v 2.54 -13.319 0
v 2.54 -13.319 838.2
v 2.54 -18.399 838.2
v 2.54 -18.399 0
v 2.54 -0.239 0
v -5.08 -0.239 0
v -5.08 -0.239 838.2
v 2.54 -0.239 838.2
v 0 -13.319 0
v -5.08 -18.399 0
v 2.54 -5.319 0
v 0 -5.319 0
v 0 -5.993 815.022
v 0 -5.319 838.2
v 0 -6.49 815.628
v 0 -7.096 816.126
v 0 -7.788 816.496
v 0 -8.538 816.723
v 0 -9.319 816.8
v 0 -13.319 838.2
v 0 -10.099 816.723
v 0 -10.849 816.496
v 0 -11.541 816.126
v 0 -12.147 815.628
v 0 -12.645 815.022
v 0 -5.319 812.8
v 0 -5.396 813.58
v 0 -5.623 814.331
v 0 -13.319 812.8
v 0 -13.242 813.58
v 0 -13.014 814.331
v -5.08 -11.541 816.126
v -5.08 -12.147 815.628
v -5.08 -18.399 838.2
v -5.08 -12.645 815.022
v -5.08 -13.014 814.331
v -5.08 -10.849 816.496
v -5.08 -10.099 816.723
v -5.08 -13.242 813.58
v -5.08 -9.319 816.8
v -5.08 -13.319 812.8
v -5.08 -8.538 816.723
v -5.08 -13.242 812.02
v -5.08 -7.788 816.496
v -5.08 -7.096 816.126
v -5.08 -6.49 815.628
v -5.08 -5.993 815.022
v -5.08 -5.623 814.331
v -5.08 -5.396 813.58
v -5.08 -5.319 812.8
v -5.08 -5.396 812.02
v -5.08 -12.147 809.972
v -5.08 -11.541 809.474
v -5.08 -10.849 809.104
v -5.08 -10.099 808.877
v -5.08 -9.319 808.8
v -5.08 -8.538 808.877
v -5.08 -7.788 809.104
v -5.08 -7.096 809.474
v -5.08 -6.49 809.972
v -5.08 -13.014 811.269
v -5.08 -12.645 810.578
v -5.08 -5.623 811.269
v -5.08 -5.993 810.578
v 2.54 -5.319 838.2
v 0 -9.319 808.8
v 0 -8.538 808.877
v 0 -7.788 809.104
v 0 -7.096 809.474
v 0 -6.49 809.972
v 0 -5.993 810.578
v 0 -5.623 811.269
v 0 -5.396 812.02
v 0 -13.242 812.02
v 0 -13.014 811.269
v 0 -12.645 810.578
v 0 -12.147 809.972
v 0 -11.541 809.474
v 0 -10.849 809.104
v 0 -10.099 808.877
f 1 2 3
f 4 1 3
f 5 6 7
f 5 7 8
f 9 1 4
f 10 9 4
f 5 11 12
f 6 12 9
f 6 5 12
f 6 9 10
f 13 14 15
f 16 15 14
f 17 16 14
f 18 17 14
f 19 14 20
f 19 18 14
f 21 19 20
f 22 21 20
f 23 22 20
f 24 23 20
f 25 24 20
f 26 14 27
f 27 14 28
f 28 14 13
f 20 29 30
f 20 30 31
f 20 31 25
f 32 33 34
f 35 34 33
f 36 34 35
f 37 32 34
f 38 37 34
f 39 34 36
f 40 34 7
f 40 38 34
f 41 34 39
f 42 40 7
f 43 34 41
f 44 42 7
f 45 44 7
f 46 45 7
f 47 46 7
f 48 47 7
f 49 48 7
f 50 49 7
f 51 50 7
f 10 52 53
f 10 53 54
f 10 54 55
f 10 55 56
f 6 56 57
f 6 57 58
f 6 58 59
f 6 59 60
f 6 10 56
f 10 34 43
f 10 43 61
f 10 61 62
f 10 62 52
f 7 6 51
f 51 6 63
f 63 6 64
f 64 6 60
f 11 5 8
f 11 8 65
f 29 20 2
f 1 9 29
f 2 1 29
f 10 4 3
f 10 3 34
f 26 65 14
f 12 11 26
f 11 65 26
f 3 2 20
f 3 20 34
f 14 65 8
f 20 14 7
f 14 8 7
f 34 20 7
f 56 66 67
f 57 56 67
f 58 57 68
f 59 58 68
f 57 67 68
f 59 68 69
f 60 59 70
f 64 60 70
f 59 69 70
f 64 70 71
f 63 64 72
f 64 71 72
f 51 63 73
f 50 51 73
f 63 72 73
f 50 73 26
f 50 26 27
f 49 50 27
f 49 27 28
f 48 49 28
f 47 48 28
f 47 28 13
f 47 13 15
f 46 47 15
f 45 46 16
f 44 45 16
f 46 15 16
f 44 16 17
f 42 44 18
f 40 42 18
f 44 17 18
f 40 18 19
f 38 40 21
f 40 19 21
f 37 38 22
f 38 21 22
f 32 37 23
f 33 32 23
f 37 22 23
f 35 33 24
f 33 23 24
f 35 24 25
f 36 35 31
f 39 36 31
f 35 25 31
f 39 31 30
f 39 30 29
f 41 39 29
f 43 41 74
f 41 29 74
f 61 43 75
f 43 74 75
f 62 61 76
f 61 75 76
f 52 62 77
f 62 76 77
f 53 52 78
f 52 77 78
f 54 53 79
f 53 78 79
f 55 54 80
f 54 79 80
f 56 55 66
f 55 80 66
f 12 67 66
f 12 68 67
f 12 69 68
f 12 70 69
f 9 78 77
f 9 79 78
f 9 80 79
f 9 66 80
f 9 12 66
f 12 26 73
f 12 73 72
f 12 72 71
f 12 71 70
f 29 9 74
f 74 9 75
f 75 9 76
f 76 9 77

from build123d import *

# Parameters (mm, degrees)
BOSS_EXTRUDE1_DEPTH   = 838.2
F_8_0MM_DOWEL_HOLE1_D = 8


with BuildPart() as part:
    # Sketch1 → Boss-Extrude1 (new body)
    with BuildSketch(Plane.XY):
        Polygon((0, -5.318754457), (0, -13.318754457), (2.54, -13.318754457), (2.54, -18.398754457), (-5.08, -18.398754457), (-5.08, -0.238754457), (2.54, -0.238754457), (2.54, -5.318754457), align=None)
    extrude(amount=BOSS_EXTRUDE1_DEPTH)

    # Ø8.0mm Dowel Hole1 (through all)
    with Locations(Plane.ZY.offset(5.08)):
        with Locations((812.8, -9.318754457), (28.049203363, -40.337204001)):
            Hole(F_8_0MM_DOWEL_HOLE1_D / 2)


solid = part.part
